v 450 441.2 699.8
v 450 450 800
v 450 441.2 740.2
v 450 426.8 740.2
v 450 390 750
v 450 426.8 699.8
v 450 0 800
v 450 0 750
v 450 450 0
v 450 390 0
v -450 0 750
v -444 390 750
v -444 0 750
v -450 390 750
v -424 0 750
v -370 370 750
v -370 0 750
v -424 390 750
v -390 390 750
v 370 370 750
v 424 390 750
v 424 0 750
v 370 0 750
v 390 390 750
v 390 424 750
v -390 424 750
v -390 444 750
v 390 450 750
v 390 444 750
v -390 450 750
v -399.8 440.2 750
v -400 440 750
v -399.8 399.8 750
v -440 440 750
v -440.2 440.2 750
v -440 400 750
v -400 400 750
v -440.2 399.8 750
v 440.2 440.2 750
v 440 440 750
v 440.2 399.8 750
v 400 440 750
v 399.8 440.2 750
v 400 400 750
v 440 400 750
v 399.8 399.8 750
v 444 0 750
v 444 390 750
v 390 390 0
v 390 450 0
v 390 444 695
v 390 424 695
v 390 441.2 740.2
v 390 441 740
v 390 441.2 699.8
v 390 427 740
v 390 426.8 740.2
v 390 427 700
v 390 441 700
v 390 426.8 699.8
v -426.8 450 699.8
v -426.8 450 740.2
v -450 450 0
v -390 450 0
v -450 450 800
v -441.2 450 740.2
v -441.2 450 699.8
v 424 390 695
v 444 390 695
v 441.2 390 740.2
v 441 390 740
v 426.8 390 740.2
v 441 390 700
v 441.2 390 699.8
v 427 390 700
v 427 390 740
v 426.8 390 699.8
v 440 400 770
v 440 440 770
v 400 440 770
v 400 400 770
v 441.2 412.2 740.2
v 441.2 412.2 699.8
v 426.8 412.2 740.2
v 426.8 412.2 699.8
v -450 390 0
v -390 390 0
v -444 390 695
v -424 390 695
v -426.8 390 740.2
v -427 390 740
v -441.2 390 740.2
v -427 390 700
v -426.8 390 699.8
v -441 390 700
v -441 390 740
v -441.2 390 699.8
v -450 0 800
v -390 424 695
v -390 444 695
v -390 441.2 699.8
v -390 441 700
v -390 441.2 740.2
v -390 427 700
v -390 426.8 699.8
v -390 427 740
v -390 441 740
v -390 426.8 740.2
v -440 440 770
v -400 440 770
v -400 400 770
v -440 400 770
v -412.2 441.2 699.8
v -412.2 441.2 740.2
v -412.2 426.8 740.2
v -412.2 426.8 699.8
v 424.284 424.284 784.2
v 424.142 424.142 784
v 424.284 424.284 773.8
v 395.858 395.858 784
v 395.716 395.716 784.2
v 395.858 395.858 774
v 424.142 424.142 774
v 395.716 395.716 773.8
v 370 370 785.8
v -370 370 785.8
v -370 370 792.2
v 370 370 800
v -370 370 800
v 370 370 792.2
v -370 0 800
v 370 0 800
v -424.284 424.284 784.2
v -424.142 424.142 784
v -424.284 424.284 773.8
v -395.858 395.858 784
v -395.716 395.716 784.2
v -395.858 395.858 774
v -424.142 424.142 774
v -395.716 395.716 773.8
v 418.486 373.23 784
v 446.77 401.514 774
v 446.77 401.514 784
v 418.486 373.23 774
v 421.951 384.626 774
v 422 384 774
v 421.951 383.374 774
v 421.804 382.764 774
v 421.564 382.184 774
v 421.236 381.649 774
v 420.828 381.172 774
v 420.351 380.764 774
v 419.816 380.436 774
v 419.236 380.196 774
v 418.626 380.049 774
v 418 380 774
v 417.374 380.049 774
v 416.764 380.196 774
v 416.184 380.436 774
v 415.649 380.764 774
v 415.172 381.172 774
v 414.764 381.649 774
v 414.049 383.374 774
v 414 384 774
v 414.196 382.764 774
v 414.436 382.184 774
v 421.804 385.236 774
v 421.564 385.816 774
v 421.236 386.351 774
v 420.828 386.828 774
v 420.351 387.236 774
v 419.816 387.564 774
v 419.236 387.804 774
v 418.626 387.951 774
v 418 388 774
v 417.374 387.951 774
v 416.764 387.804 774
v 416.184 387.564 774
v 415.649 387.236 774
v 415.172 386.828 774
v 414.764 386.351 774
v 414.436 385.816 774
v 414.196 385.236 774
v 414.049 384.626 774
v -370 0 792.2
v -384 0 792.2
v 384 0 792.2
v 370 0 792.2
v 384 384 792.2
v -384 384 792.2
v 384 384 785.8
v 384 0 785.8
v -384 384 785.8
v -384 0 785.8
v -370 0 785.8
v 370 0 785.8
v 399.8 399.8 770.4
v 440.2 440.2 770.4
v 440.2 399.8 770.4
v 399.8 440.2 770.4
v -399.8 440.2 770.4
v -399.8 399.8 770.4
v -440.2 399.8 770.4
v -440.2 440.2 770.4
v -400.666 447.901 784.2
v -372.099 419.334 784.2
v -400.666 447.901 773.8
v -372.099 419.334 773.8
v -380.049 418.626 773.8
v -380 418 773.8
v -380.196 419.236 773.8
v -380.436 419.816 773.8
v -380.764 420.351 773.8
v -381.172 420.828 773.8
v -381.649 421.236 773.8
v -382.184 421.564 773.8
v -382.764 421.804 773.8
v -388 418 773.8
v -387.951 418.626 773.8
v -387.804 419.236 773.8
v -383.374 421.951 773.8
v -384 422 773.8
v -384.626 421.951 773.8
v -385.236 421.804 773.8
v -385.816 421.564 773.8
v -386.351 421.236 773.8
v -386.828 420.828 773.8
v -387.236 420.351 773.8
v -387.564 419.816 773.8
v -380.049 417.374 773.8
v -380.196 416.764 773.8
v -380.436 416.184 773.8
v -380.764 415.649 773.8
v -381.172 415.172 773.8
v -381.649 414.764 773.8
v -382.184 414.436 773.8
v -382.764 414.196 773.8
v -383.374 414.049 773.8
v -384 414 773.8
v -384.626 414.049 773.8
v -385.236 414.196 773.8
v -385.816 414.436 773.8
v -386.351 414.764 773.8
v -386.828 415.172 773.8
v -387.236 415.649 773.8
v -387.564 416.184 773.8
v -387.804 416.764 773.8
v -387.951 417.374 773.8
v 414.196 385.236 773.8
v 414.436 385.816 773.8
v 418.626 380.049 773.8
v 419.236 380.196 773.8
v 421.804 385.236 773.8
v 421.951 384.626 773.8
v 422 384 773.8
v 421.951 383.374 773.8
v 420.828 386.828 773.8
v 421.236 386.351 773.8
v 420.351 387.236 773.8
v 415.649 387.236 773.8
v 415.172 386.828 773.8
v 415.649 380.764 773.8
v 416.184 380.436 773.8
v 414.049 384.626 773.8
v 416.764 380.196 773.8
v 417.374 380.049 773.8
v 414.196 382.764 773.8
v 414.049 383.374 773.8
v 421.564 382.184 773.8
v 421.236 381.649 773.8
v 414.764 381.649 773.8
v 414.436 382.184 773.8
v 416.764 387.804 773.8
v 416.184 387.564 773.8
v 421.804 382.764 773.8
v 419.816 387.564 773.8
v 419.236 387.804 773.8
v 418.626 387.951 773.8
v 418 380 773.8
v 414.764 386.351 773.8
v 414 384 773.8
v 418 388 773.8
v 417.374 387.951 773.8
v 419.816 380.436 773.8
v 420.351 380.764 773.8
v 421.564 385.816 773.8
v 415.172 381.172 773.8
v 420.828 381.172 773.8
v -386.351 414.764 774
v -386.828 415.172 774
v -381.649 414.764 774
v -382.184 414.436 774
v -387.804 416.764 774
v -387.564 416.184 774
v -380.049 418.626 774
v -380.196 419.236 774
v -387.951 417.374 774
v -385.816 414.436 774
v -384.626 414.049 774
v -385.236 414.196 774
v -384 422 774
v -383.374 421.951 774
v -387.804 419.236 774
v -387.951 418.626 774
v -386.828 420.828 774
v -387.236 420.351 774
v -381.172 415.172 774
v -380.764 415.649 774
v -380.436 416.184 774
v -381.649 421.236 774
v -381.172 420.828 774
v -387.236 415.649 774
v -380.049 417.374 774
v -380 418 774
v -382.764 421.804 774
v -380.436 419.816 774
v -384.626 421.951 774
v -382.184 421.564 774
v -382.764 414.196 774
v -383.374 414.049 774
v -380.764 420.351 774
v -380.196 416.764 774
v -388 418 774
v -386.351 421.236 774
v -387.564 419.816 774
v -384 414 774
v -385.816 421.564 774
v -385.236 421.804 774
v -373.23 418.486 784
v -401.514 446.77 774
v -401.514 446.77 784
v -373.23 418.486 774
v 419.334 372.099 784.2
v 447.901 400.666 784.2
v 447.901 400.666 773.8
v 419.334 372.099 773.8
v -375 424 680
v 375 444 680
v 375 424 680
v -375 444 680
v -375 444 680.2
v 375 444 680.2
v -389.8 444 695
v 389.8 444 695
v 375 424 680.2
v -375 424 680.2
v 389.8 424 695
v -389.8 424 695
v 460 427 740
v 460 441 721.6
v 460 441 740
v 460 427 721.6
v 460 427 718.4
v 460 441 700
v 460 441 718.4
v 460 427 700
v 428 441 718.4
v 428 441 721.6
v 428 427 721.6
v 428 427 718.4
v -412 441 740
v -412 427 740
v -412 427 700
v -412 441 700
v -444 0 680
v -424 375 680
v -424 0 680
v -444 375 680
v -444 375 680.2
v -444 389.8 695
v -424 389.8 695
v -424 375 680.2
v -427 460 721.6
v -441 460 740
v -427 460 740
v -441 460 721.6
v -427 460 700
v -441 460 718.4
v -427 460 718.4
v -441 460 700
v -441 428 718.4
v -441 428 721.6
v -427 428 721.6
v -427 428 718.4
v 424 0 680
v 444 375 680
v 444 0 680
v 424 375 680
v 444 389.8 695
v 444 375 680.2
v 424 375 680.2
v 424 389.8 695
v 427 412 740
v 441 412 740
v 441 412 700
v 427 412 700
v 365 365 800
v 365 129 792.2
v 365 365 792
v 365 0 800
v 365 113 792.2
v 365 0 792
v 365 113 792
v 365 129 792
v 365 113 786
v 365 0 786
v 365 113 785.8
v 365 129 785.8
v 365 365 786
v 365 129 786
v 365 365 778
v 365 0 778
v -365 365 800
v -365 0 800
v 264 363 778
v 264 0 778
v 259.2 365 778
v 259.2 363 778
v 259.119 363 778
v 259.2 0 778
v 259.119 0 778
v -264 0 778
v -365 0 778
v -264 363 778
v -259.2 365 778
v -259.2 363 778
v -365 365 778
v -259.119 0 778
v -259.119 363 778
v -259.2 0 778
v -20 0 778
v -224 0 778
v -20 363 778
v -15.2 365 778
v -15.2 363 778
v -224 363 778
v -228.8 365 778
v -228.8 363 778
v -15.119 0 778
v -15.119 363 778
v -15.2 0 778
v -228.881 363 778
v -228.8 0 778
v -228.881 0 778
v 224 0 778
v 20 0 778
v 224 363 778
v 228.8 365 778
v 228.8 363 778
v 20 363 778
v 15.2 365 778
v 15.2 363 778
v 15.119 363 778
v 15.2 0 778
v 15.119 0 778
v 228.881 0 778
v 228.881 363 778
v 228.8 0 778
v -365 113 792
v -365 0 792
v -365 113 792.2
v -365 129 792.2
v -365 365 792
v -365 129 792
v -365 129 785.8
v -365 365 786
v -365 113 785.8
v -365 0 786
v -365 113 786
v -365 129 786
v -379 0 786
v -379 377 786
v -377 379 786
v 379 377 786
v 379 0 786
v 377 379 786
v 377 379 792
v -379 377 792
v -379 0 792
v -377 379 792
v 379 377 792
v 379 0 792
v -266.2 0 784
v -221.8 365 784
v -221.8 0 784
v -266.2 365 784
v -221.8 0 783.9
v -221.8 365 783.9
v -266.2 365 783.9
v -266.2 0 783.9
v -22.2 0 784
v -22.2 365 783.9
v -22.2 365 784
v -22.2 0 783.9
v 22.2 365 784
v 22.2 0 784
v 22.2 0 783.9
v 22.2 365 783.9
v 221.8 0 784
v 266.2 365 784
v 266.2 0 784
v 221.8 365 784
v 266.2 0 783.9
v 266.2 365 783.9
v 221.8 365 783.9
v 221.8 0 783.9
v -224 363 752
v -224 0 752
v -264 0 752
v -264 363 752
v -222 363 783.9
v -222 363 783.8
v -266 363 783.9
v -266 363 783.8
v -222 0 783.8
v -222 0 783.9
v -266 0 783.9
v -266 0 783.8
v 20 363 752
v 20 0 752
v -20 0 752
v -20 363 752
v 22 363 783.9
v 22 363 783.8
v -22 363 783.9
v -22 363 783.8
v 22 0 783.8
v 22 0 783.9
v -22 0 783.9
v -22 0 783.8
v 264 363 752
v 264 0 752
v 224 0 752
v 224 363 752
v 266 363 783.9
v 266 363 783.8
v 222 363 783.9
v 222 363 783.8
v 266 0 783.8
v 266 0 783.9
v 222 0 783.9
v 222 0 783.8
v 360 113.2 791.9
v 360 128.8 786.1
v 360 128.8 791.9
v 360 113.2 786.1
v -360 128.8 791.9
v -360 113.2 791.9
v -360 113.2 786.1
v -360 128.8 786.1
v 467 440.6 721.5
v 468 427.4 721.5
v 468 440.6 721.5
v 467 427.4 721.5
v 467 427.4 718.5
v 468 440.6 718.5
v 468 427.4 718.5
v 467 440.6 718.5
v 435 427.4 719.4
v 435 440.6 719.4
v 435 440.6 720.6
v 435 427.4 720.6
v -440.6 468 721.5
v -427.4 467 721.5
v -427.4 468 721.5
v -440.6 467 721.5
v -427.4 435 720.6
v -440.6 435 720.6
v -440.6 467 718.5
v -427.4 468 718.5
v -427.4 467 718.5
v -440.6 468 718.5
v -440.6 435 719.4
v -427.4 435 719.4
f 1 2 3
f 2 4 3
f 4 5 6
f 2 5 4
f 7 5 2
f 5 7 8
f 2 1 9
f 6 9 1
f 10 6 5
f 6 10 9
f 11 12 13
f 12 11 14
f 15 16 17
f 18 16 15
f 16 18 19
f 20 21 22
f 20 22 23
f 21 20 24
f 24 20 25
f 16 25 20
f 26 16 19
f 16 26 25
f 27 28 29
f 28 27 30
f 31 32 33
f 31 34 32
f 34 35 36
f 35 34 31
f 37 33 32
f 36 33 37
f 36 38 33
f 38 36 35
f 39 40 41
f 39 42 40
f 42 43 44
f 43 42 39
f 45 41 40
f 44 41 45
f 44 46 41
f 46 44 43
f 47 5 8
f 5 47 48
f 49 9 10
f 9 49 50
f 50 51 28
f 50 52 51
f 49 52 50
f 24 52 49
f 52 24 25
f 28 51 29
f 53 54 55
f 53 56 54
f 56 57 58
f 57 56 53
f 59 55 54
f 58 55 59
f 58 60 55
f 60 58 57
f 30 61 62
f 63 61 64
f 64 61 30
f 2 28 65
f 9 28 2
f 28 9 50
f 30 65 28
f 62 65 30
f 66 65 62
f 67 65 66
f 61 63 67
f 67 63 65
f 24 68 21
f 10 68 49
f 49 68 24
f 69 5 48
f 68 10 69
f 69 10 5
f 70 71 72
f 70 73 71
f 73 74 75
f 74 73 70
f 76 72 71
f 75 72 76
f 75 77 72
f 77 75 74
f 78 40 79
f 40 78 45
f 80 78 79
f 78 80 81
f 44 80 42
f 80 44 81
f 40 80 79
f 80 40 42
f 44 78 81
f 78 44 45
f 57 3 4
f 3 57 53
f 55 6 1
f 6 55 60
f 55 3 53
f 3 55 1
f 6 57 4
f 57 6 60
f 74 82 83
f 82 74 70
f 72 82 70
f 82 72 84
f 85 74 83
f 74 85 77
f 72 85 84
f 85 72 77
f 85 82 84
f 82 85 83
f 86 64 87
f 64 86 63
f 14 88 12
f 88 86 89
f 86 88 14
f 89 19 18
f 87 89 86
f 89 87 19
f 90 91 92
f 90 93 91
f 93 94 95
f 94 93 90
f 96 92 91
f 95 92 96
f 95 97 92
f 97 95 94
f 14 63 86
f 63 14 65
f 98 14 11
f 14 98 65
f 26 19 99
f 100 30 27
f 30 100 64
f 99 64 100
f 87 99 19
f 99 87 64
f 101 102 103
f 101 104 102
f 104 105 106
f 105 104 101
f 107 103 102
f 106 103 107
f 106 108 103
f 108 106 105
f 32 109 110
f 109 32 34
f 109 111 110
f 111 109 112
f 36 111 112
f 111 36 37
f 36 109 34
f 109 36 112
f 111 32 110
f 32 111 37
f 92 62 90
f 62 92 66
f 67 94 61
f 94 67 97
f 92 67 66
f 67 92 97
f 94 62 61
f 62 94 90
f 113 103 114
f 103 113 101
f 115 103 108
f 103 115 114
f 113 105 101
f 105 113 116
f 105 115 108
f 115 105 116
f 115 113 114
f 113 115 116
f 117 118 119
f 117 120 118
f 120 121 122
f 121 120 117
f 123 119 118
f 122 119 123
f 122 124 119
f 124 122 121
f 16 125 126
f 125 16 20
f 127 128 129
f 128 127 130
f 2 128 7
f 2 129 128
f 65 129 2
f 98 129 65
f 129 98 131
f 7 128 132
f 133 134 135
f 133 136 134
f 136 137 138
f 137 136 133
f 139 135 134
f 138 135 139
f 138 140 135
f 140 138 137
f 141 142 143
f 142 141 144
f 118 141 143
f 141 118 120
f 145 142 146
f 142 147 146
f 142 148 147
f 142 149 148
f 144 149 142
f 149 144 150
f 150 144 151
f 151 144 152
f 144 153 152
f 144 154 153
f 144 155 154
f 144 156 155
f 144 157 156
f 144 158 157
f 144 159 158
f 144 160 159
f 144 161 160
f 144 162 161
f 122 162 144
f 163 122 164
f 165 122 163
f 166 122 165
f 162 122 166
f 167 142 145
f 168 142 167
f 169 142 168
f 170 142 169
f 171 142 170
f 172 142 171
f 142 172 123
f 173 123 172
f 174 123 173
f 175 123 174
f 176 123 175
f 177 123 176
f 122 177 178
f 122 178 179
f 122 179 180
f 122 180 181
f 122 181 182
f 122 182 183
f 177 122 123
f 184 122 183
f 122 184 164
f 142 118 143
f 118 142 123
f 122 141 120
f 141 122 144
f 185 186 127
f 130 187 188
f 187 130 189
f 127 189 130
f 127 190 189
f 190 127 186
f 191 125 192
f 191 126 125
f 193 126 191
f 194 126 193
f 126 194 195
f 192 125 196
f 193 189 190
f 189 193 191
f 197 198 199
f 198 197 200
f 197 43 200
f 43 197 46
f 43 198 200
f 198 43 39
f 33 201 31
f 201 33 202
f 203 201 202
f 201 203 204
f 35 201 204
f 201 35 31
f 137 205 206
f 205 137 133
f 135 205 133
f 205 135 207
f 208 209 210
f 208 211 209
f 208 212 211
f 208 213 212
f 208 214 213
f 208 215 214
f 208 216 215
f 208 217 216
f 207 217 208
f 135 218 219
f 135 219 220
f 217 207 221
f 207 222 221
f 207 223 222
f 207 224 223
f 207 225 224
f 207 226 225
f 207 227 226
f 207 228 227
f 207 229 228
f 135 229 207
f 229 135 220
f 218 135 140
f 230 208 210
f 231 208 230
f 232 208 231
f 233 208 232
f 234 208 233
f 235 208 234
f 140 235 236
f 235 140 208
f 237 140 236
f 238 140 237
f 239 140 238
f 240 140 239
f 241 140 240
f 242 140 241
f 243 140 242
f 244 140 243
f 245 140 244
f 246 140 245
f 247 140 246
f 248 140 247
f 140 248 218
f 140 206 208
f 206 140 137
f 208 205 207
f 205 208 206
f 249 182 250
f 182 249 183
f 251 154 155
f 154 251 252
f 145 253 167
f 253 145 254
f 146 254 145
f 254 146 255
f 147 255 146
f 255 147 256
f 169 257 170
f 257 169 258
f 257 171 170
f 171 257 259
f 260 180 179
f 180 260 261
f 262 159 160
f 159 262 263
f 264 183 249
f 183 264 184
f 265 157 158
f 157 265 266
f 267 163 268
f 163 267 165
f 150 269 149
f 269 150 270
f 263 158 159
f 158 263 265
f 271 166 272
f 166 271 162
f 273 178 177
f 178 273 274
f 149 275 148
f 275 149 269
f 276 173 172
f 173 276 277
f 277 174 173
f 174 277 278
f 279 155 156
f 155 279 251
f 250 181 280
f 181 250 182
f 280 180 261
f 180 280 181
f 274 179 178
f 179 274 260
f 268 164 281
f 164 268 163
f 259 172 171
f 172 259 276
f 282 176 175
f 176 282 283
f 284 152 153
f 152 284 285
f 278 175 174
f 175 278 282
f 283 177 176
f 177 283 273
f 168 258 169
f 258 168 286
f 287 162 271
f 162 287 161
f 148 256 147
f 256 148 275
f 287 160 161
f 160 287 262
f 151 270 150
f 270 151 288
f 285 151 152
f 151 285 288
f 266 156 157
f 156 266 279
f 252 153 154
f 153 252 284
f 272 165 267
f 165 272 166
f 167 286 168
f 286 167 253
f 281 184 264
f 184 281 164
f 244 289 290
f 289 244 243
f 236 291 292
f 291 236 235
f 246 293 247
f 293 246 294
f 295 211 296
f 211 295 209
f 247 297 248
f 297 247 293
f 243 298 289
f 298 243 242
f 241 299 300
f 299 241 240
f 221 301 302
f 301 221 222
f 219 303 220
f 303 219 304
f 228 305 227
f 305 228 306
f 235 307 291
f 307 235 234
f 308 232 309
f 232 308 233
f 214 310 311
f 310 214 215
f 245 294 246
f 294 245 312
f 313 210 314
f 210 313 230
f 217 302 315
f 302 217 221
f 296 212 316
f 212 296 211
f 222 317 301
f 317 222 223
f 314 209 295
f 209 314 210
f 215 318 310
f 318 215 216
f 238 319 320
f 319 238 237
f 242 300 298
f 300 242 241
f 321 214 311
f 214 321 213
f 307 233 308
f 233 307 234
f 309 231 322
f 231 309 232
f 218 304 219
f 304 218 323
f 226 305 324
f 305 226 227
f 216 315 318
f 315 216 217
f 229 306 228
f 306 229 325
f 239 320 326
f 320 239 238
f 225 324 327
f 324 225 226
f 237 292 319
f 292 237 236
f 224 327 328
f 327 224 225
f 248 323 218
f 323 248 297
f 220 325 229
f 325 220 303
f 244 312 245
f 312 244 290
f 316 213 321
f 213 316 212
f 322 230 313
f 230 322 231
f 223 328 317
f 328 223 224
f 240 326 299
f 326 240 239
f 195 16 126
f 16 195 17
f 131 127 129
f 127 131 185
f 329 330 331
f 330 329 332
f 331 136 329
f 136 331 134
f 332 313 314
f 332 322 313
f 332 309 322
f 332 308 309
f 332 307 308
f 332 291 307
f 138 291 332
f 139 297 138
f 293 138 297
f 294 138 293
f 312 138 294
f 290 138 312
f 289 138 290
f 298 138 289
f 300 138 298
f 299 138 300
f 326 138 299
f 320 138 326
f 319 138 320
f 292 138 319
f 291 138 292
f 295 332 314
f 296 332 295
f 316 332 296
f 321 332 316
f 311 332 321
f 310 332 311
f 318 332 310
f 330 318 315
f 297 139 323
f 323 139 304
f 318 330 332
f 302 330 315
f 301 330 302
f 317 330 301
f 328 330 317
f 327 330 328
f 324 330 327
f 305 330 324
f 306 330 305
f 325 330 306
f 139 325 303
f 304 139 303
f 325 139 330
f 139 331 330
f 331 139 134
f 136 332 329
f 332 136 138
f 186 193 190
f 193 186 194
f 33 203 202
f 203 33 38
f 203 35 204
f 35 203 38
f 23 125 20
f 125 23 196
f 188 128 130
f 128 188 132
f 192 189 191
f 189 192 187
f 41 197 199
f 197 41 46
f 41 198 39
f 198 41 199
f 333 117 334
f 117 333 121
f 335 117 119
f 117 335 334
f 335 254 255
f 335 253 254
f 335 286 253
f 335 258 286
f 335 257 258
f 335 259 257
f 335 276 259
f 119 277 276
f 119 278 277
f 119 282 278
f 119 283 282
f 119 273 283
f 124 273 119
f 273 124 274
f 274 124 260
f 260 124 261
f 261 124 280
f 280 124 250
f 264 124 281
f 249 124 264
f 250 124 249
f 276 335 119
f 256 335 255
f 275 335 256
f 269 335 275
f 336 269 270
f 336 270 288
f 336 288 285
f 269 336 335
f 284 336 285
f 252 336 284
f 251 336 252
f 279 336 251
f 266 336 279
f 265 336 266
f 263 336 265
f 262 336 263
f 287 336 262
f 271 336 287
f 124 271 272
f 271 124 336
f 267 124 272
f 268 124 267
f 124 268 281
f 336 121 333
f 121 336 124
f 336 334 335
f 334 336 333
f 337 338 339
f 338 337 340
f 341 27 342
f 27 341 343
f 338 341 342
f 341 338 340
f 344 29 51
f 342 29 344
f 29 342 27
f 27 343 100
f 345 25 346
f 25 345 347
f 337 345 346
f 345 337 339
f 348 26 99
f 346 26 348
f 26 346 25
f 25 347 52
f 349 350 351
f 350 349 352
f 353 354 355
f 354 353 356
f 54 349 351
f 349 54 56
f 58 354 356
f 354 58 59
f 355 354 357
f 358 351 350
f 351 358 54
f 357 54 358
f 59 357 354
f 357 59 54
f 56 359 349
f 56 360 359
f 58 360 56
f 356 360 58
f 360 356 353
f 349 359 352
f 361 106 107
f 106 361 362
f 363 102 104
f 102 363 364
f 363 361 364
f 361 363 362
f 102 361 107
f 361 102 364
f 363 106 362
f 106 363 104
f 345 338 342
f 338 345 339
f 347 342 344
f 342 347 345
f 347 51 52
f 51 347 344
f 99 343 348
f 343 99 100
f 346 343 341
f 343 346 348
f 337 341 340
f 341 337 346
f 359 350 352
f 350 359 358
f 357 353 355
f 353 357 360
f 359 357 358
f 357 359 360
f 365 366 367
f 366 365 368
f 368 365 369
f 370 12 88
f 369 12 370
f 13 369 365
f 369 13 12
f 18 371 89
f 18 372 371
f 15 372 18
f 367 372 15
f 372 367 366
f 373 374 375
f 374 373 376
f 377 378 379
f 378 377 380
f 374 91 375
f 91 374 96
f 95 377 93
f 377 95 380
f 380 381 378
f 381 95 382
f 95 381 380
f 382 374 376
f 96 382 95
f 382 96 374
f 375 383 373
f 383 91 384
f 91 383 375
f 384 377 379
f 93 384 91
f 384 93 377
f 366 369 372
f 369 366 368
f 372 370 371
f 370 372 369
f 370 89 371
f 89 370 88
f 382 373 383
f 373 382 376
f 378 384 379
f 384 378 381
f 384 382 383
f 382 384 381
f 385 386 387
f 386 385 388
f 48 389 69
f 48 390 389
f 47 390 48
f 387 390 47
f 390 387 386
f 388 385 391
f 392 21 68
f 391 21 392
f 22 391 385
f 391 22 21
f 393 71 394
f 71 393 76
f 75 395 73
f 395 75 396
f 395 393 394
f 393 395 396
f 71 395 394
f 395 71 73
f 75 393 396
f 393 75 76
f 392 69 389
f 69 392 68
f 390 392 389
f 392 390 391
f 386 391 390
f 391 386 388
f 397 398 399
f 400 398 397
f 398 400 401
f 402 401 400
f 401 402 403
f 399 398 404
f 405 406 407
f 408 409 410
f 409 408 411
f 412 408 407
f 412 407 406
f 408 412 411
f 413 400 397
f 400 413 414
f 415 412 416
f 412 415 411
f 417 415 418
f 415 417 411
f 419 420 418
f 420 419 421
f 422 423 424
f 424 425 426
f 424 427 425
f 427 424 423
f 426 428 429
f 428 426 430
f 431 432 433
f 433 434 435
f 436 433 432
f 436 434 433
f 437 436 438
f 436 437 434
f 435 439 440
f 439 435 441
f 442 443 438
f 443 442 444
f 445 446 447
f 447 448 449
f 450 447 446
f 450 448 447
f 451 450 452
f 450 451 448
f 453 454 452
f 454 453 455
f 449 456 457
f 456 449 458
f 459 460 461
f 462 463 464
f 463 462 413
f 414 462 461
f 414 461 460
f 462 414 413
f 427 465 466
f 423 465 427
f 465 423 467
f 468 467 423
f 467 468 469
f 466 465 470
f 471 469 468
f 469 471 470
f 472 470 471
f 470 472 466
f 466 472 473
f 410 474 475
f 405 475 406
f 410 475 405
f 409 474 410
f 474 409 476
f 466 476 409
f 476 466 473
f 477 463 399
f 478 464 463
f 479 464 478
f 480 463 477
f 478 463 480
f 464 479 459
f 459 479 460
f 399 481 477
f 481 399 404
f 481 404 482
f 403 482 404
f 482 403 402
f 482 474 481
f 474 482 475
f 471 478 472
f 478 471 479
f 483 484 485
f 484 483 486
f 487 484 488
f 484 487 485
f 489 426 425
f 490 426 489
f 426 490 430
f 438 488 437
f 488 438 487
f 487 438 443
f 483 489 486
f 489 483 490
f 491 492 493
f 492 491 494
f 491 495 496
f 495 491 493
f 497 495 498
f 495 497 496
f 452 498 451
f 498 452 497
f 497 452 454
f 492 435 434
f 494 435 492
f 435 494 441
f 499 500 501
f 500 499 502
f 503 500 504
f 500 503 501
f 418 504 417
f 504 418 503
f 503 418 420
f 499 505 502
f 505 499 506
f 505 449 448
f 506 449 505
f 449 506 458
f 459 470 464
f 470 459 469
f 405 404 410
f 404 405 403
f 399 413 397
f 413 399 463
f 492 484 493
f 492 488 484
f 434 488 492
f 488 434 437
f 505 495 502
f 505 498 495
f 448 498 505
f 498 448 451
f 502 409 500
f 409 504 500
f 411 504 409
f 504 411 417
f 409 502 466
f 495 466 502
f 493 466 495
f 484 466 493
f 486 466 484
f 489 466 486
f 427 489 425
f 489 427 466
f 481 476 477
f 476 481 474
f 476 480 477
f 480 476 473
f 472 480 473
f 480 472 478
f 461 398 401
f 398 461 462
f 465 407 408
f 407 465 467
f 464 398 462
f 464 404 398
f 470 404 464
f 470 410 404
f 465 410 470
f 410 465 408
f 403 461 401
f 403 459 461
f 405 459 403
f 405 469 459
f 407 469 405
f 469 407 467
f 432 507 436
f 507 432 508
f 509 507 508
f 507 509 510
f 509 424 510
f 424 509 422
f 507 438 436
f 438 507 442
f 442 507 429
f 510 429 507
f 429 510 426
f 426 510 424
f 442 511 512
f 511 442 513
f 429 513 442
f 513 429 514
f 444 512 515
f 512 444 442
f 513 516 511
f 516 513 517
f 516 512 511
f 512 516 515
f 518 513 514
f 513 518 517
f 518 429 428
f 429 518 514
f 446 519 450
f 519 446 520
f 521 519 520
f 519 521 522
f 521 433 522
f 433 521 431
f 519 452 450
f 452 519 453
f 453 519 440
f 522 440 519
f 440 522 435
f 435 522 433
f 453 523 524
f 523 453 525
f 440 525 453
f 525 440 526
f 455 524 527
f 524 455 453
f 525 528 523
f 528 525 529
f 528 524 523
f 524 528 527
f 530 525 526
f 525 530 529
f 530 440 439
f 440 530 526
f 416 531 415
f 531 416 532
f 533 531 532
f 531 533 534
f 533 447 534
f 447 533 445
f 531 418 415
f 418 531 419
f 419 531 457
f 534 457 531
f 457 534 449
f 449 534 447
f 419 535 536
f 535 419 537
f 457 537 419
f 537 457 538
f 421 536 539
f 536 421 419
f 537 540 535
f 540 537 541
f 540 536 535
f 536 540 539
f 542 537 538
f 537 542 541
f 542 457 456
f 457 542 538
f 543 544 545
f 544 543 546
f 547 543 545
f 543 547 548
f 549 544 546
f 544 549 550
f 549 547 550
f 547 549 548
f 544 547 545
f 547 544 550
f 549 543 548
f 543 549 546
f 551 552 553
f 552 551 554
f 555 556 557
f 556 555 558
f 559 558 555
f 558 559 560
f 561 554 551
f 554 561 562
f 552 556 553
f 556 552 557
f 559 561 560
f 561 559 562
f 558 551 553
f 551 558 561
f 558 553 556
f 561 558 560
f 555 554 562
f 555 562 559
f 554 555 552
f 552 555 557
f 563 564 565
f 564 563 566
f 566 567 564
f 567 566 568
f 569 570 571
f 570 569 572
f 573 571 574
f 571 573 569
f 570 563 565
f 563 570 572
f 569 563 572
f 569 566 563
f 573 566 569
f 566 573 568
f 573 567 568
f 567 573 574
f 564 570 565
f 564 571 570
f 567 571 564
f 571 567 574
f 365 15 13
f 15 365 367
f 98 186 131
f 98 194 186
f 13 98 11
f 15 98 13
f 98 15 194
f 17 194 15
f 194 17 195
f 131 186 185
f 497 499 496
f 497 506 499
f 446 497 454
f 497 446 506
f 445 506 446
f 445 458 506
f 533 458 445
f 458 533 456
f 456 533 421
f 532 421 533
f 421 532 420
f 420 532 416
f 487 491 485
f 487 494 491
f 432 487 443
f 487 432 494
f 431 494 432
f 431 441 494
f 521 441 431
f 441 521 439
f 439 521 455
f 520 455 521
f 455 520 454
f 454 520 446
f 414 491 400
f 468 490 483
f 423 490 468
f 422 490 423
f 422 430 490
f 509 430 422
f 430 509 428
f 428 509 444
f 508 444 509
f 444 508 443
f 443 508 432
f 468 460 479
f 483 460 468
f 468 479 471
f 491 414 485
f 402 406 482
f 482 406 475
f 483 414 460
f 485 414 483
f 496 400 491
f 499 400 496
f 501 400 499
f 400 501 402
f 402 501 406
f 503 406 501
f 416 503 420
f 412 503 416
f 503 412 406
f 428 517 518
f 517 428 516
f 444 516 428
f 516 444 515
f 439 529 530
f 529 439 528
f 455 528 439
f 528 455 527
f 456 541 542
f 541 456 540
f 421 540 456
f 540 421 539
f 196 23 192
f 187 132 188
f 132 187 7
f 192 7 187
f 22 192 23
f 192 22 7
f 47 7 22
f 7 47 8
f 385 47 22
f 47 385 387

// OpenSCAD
// file: parts.scad
$fn=40;

// ---- 桌腿 ----

module leg(){
  difference(){
    union(){
      translate([390.000,390.000,0.000]) cube([60.000,60.000,750.000]);
      translate([400.000,400.000,750.000]) cube([40.000,40.000,20.000]);
    }
    // 牙板透榫槽（沿 +x，+y 侧牙板 A 端穿入）
    translate([389.000,426.800,699.800]) cube([62.000,14.400,40.400]);
    // 牙板闷榫槽（沿 +y，+x 侧牙板 B 端）
    translate([426.800,389.000,699.800]) cube([14.400,23.200,40.400]);
  }
}

// ---- 边框 ----

module rail(){
  difference(){
    union(){
      translate([0,0,750]) linear_extrude(height=50) polygon(points=[[-370,370],[370,370],[450.0,450.0],[-450.0,450.0]]);
      translate([420.607,399.393,779.0]) rotate([0,0,-45]) cube([34,40,10],center=true);
    }
    // 面板槽：全长开通至 45° 端面（角部两框的槽合起来成 L 形）
    translate([-450.000,370.000,785.800]) cube([900.000,14.000,6.400]);
    // 腿顶榫卯（两端各半，合起来 40x40x20）
    translate([399.800,399.800,750.000]) cube([40.400,40.400,20.400]);
    translate([-440.200,399.800,750.000]) cube([40.400,40.400,20.400]);
    // 格角暗榫卯
    translate([-398.545,421.455,779.0]) rotate([0,0,45]) cube([34.4,40.4,10.4],center=true);
    // 竹销孔：+x 端穿暗榫，-x 端穿本体
    translate([418,384,750]) cylinder(h=34,r=4.0,$fn=40);
    translate([-384,418,750]) cylinder(h=34,r=4.0,$fn=40);
  }
}

// ---- 牙板 ----

module apron(){
  difference(){
    union(){
      translate([-390.000,424.000,680.000]) cube([780.000,20.000,70.000]);
      // A 端：透榫（390..460）
      translate([390.000,427.000,700.000]) cube([70.000,14.000,40.000]);
      // B 端：闷榫（-412..-390）
      translate([-412.000,427.000,700.000]) cube([22.000,14.000,40.000]);
    }
    hull(){ translate([375.000,423.500,680.000]) cube([15.000,21.000,0.200]); translate([389.800,423.500,680.000]) cube([0.200,21.000,15.000]); }
    hull(){ translate([-390.000,423.500,680.000]) cube([15.000,21.000,0.200]); translate([-390.000,423.500,680.000]) cube([0.200,21.000,15.000]); }
    // 透榫楔槽（横槽，撑开榫头上下两片）
    translate([428.000,426.900,718.400]) cube([32.200,14.200,3.200]);
  }
}

// ---- 面板-边板 ----

module panel_outer(){
  difference(){
    union(){
      translate([-365.000,-365.000,778.000]) cube([730.000,244.000,22.000]);
      translate([0,0,786]) linear_extrude(height=6) polygon(points=[[-379,-121],[-379,-377],[-377,-379],[377,-379],[379,-377],[379,-121],[365,-121],[365,-365],[-365,-365],[-365,-121]]);
    }
    // 内侧龙凤榫槽（向板内 8 深：y -129..-121）
    translate([-365.000,-129.000,785.800]) cube([730.000,8.000,6.400]);
    // 穿带燕尾槽
    hull(){ translate([-259.200,-365.000,778.000]) cube([30.400,244.000,0.100]); translate([-266.200,-365.000,783.900]) cube([44.400,244.000,0.100]); }
    hull(){ translate([-15.200,-365.000,778.000]) cube([30.400,244.000,0.100]); translate([-22.200,-365.000,783.900]) cube([44.400,244.000,0.100]); }
    hull(){ translate([228.800,-365.000,778.000]) cube([30.400,244.000,0.100]); translate([221.800,-365.000,783.900]) cube([44.400,244.000,0.100]); }
  }
}

// ---- 面板-中板 ----

module panel_middle(){
  difference(){
    union(){
      translate([-365.000,-121.000,778.000]) cube([730.000,242.000,22.000]);
      translate([365.000,-121.000,786.000]) cube([14.000,242.000,6.000]);
      translate([-379.000,-121.000,786.000]) cube([14.000,242.000,6.000]);
    }
    // 两侧龙凤榫槽（各向板内 8 深）
    translate([-365.000,-121.000,785.800]) cube([730.000,8.000,6.400]);
    translate([-365.000,113.000,785.800]) cube([730.000,8.000,6.400]);
    hull(){ translate([-259.200,-121.000,778.000]) cube([30.400,242.000,0.100]); translate([-266.200,-121.000,783.900]) cube([44.400,242.000,0.100]); }
    hull(){ translate([-15.200,-121.000,778.000]) cube([30.400,242.000,0.100]); translate([-22.200,-121.000,783.900]) cube([44.400,242.000,0.100]); }
    hull(){ translate([228.800,-121.000,778.000]) cube([30.400,242.000,0.100]); translate([221.800,-121.000,783.900]) cube([44.400,242.000,0.100]); }
  }
}

// ---- 穿带 ----

module cleat(){
  union(){
    translate([-20.000,-363.000,752.000]) cube([40.000,726.000,26.000]);
    hull(){
      translate([-15.000,-363.000,777.900]) cube([30.000,726.000,0.050]);
      translate([-22.000,-363.000,783.800]) cube([44.000,726.000,0.100]);
    }
  }
}

// ---- 穿簧 ----
module spline(){ translate([-360.000,-7.800,786.100]) cube([720.000,15.600,5.800]); }
// ---- 木楔 ----
module wedge(){ hull(){ translate([435.000,427.400,719.400]) cube([1.000,13.200,1.200]); translate([467.000,427.400,718.500]) cube([1.000,13.200,3.000]); } }
// ---- 竹销 ----
module pin(){ translate([0,0,750]) cylinder(h=34,r=4.0,$fn=40); }
// main file
include <parts.scad>
difference(){
 union(){
color([0.42,0.28,0.16]) translate([0,0,0]) rotate([0,0,0]) leg();
color([0.42,0.28,0.16]) translate([0,0,0]) rotate([0,0,90]) leg();
color([0.42,0.28,0.16]) translate([0,0,0]) rotate([0,0,180]) leg();
color([0.42,0.28,0.16]) translate([0,0,0]) rotate([0,0,270]) leg();
color([0.54,0.37,0.21]) translate([0,0,0]) rotate([0,0,0]) rail();
color([0.54,0.37,0.21]) translate([0,0,0]) rotate([0,0,90]) rail();
color([0.54,0.37,0.21]) translate([0,0,0]) rotate([0,0,180]) rail();
color([0.54,0.37,0.21]) translate([0,0,0]) rotate([0,0,270]) rail();
color([0.49,0.33,0.19]) translate([0,0,0]) rotate([0,0,0]) apron();
color([0.49,0.33,0.19]) translate([0,0,0]) rotate([0,0,90]) apron();
color([0.49,0.33,0.19]) translate([0,0,0]) rotate([0,0,180]) apron();
color([0.49,0.33,0.19]) translate([0,0,0]) rotate([0,0,270]) apron();
color([0.82,0.66,0.45]) translate([0,0,0]) rotate([0,0,0]) panel_outer();
color([0.82,0.66,0.45]) translate([0,0,0]) rotate([0,0,180]) panel_outer();
color([0.85,0.7,0.49]) translate([0,0,0]) rotate([0,0,0]) panel_middle();
color([0.62,0.44,0.26]) translate([-244,0,0]) rotate([0,0,0]) cleat();
color([0.62,0.44,0.26]) translate([0,0,0]) rotate([0,0,0]) cleat();
color([0.62,0.44,0.26]) translate([244,0,0]) rotate([0,0,0]) cleat();
color([0.88,0.78,0.58]) translate([0,-121,0]) rotate([0,0,0]) spline();
color([0.88,0.78,0.58]) translate([0,121,0]) rotate([0,0,0]) spline();
color([0.3,0.19,0.1]) translate([0,0,0]) rotate([0,0,0]) wedge();
color([0.3,0.19,0.1]) translate([0,0,0]) rotate([0,0,90]) wedge();
color([0.3,0.19,0.1]) translate([0,0,0]) rotate([0,0,180]) wedge();
color([0.3,0.19,0.1]) translate([0,0,0]) rotate([0,0,270]) wedge();
color([0.86,0.8,0.55]) translate([418,384,0]) rotate([0,0,0]) pin();
color([0.86,0.8,0.55]) translate([-384,418,0]) rotate([0,0,0]) pin();
color([0.86,0.8,0.55]) translate([-418,-384,0]) rotate([0,0,0]) pin();
color([0.86,0.8,0.55]) translate([384,-418,0]) rotate([0,0,0]) pin();
 }
 translate([-600,-600,-10]) cube([1200,600,1000]);
}
